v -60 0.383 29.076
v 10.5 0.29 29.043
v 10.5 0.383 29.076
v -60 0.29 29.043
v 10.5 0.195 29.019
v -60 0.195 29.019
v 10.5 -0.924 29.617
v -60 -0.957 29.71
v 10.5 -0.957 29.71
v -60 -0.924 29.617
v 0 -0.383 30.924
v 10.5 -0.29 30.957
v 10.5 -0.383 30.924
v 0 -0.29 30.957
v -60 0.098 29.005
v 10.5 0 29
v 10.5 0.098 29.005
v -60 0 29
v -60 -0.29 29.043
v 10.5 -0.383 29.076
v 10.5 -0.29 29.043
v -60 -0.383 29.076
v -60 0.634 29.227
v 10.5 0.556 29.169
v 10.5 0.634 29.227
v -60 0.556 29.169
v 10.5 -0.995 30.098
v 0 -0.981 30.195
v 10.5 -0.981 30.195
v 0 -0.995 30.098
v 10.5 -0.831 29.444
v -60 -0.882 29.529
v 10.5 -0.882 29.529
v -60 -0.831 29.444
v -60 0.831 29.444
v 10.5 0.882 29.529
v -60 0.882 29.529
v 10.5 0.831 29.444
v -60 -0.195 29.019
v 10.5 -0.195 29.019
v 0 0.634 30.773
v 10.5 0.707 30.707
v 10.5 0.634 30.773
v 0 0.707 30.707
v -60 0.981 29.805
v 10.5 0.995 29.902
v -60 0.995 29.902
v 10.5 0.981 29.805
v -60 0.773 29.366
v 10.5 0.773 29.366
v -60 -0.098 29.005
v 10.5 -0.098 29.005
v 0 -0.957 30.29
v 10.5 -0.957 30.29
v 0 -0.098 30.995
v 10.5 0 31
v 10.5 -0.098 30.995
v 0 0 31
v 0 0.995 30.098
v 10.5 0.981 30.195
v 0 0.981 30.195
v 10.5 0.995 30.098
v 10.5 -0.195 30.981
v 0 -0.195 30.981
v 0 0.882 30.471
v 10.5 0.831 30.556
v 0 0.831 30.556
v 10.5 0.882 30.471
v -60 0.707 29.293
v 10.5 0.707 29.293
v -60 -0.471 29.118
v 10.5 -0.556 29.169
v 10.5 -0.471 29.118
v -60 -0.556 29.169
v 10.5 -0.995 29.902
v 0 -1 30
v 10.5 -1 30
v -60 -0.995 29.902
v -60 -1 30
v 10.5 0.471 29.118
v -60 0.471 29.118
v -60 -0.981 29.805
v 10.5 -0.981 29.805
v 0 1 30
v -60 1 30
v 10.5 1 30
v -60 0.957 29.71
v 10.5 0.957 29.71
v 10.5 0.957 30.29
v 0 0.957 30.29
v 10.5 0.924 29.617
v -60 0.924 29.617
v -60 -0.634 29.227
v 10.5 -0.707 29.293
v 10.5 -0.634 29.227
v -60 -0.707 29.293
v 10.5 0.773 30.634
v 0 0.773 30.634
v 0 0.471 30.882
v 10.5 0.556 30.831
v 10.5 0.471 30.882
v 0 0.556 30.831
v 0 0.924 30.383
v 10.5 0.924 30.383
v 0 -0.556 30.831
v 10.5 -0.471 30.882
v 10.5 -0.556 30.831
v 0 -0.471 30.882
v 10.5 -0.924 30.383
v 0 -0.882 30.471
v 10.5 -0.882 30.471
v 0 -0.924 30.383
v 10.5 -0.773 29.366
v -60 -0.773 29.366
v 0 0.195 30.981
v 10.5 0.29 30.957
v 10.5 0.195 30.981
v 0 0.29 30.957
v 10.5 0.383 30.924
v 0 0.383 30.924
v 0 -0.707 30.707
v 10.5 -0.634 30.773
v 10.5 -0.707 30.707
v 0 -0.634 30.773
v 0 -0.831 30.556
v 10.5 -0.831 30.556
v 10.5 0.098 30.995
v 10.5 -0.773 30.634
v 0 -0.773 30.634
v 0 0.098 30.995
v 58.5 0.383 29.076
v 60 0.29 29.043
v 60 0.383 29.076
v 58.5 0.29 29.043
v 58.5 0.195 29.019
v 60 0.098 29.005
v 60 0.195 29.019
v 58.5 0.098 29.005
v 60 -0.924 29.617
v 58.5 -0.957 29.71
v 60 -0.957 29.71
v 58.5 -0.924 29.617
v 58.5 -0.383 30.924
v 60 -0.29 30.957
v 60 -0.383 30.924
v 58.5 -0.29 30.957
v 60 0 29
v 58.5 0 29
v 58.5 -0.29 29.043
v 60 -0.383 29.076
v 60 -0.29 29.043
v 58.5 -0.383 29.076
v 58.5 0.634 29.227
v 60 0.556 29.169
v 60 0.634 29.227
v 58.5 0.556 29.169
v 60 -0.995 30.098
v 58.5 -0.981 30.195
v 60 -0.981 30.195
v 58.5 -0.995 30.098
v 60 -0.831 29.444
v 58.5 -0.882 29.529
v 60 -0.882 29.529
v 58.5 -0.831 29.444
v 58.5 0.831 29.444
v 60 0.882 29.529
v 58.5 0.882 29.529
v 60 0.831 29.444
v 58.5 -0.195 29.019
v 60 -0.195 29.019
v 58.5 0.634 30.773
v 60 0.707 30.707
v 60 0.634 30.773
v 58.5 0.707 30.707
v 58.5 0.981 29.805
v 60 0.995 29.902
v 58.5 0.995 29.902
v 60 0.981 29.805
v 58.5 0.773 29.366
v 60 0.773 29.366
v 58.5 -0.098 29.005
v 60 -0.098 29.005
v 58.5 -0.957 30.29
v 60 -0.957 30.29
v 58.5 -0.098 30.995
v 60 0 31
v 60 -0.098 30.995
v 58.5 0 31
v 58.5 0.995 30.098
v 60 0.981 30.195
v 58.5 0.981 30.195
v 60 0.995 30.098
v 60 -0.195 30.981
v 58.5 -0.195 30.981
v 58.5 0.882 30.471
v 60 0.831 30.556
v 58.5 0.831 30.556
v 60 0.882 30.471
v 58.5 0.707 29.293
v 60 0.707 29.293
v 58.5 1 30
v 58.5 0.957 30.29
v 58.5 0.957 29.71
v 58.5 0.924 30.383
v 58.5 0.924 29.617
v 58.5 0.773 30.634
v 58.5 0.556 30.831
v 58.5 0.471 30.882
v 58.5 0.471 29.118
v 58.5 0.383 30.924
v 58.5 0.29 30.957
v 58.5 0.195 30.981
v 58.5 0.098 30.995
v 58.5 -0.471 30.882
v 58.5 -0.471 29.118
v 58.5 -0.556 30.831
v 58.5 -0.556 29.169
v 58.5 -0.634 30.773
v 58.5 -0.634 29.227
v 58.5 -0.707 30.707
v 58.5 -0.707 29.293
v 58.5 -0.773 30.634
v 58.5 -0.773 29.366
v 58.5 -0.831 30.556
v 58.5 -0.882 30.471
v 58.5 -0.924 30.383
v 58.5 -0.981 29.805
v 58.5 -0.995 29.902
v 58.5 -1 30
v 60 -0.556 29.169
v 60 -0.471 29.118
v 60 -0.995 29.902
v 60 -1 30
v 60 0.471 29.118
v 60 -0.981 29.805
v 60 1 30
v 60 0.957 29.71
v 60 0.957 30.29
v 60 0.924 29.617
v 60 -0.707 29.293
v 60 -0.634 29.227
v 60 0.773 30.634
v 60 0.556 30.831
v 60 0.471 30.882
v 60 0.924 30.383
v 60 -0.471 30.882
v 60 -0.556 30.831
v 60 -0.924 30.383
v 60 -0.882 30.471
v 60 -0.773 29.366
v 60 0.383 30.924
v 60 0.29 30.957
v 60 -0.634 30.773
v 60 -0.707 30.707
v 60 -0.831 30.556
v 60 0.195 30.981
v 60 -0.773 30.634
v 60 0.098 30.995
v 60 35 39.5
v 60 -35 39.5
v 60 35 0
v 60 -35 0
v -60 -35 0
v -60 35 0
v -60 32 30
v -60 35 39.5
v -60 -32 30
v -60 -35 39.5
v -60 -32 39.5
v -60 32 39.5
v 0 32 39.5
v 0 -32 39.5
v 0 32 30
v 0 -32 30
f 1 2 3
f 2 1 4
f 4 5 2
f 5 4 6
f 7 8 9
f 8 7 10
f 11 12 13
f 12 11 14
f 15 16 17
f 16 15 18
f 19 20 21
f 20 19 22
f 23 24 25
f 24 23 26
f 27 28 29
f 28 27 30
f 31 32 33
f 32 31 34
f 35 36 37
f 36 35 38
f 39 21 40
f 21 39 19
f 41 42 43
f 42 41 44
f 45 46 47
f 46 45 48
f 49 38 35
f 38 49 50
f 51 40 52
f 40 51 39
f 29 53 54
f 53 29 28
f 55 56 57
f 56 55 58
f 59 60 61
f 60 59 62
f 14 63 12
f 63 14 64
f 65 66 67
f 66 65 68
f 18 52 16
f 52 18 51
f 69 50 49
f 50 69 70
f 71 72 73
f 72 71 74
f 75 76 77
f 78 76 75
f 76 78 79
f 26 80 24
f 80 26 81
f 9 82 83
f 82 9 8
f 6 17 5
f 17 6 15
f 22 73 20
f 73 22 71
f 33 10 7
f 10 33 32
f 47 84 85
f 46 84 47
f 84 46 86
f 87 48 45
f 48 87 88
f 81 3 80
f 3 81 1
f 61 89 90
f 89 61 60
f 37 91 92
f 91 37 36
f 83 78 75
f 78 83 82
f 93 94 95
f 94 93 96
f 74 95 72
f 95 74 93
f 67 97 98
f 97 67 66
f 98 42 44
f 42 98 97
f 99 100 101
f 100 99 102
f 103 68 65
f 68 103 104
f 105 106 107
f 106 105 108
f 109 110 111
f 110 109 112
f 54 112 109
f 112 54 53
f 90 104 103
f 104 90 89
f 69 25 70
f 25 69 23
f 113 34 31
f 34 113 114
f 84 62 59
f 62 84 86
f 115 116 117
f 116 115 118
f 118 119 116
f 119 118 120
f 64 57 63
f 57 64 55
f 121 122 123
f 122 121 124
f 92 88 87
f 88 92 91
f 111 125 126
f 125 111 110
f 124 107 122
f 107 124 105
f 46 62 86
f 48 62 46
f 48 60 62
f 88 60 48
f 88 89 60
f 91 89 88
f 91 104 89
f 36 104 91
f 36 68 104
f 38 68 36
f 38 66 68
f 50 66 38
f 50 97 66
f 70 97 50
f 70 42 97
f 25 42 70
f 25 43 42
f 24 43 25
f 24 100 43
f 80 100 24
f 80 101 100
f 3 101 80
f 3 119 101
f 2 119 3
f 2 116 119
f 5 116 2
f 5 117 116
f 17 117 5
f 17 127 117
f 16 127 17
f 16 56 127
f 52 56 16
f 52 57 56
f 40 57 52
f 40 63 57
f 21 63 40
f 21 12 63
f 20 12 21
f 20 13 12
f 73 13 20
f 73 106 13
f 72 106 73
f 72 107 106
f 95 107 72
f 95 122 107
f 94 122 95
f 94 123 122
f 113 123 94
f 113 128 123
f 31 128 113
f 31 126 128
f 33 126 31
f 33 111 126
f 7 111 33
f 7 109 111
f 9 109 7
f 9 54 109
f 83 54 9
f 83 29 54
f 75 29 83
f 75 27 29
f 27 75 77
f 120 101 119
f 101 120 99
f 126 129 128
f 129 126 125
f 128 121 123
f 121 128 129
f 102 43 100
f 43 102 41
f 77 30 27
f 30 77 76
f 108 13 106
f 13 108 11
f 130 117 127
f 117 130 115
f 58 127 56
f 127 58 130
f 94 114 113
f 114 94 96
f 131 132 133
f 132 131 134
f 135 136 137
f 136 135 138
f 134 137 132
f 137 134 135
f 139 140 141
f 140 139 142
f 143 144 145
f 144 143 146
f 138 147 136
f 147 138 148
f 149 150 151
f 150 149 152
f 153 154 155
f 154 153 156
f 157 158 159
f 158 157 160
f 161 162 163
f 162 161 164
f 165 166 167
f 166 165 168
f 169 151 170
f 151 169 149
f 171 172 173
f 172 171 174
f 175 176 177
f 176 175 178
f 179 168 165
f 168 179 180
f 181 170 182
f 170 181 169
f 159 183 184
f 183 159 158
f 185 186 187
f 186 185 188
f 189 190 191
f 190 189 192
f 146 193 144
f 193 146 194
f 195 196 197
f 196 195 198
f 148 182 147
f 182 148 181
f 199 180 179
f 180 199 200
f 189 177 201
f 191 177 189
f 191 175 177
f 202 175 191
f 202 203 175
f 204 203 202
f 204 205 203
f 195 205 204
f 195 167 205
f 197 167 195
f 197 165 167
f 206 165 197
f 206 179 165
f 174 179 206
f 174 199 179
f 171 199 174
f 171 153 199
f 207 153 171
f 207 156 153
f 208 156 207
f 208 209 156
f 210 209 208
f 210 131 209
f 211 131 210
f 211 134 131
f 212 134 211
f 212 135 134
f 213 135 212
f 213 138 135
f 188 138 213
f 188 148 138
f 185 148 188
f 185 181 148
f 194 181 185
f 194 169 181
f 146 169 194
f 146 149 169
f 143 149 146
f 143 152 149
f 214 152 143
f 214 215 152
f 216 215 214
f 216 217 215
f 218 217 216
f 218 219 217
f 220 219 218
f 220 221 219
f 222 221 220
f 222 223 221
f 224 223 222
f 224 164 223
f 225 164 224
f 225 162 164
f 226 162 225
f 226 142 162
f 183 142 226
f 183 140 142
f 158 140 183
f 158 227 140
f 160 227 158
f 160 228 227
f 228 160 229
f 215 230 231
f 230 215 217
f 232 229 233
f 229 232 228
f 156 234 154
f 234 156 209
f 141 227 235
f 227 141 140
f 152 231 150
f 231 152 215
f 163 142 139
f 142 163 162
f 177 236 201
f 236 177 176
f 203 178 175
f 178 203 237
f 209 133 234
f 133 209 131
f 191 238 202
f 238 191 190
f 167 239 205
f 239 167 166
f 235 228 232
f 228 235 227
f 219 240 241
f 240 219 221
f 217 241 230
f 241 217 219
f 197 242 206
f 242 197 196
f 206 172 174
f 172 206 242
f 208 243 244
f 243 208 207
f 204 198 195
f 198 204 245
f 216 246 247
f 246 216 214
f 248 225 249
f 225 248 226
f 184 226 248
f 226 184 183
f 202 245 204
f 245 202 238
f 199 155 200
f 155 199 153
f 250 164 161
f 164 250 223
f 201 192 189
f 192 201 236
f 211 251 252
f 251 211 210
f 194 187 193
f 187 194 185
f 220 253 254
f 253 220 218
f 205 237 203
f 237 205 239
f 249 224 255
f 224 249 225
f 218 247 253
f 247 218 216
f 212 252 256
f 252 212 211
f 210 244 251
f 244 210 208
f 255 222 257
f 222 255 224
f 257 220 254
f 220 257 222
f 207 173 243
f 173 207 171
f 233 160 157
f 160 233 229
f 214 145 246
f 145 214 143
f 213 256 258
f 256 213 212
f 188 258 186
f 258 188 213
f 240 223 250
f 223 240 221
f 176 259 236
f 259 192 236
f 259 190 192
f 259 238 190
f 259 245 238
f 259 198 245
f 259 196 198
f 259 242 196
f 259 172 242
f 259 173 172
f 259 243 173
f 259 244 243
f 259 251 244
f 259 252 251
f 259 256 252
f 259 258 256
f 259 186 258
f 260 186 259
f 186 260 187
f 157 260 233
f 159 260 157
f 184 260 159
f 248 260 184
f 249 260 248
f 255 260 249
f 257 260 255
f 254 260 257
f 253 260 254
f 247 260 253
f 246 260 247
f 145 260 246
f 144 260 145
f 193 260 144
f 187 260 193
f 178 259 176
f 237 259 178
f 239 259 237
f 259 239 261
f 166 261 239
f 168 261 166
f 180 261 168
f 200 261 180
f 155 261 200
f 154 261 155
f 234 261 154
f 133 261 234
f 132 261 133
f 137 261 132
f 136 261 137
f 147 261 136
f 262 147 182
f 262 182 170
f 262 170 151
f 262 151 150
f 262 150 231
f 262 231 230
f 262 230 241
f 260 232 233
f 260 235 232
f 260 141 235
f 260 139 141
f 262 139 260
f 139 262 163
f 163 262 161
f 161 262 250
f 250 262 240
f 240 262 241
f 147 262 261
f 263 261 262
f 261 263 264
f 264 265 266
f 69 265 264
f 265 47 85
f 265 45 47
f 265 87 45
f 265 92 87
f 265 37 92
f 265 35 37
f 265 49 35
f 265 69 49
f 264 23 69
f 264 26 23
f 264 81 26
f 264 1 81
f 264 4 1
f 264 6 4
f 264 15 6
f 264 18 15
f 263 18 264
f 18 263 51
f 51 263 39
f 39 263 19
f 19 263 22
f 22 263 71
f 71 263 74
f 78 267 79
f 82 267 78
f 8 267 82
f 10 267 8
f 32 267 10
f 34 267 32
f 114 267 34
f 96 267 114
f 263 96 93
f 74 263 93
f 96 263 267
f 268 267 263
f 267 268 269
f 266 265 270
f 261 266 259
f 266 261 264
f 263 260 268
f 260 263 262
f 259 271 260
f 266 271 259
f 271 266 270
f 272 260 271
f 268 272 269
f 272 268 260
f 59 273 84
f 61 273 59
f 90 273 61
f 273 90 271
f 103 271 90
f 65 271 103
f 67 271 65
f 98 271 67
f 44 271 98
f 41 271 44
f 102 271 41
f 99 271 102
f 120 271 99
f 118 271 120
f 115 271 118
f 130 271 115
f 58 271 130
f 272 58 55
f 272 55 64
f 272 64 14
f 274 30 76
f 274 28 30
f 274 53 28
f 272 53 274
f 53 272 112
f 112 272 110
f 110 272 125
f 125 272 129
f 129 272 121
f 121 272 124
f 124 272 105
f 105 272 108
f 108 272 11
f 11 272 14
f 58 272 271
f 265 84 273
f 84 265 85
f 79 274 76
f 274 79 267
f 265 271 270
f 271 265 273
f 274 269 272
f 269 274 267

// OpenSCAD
// Buffer tank for mini horizontal gel-electrophoresis box
// Print orientation: open top facing +Z, resting on XY plane at z = 0

// ---------- Parameters ----------
outer_x   = 120;   // outer length (X)
outer_y   = 70;    // outer width (Y)
outer_z   = 40;    // outer height (Z)
wall      = 3;     // wall thickness
floor     = 3;     // floor thickness

inner_h   = outer_z - wall;              // inner height above floor (37)
platform_t= 10;    // platform thickness (top at z = 13)
platform_x= 60;    // platform length in X, centred
hole_d    = 2;     // electrode hole diameter
hole_y    = 0;     // hole Y position
hole_z    = 30;    // hole Z position (above inner floor)

eps       = 0.5;   // cutter overshoot past faces

$fn = 64;

// ---------- Derived ----------
inner_w = outer_y - 2*wall;              // inner width (64)
inner_l = outer_x - 2*wall;              // inner length (114)
chamber_h = inner_h - platform_t;        // chamber height above platform (27)

// ---------- Model ----------
difference() {
    // Tank body: open top, solid floor and walls
    translate([-outer_x/2, -outer_y/2, 0])
        cube([outer_x, outer_y, outer_z]);

    // Cut out the open top (slightly above the top face)
    translate([-outer_x/2 - eps, -outer_y/2 - eps, outer_z - eps])
        cube([outer_x + 2*eps, outer_y + 2*eps, eps]);

    // Gel-tray platform, centred in X, spanning full inner width
    translate([-outer_x/2, -inner_w/2, floor + chamber_h])
        cube([platform_x, inner_w, platform_t]);

    // Horizontal electrode holes through each end wall, along X
    for (sx = [-1, 1])
        translate([sx > 0 ? outer_x/2 - hole_d/2 - eps : -outer_x/2 - eps,
                   hole_y, hole_z])
            rotate([0, 90, 0])
                cylinder(d = hole_d, h = outer_y + 2*eps, $fn = 64);
}
